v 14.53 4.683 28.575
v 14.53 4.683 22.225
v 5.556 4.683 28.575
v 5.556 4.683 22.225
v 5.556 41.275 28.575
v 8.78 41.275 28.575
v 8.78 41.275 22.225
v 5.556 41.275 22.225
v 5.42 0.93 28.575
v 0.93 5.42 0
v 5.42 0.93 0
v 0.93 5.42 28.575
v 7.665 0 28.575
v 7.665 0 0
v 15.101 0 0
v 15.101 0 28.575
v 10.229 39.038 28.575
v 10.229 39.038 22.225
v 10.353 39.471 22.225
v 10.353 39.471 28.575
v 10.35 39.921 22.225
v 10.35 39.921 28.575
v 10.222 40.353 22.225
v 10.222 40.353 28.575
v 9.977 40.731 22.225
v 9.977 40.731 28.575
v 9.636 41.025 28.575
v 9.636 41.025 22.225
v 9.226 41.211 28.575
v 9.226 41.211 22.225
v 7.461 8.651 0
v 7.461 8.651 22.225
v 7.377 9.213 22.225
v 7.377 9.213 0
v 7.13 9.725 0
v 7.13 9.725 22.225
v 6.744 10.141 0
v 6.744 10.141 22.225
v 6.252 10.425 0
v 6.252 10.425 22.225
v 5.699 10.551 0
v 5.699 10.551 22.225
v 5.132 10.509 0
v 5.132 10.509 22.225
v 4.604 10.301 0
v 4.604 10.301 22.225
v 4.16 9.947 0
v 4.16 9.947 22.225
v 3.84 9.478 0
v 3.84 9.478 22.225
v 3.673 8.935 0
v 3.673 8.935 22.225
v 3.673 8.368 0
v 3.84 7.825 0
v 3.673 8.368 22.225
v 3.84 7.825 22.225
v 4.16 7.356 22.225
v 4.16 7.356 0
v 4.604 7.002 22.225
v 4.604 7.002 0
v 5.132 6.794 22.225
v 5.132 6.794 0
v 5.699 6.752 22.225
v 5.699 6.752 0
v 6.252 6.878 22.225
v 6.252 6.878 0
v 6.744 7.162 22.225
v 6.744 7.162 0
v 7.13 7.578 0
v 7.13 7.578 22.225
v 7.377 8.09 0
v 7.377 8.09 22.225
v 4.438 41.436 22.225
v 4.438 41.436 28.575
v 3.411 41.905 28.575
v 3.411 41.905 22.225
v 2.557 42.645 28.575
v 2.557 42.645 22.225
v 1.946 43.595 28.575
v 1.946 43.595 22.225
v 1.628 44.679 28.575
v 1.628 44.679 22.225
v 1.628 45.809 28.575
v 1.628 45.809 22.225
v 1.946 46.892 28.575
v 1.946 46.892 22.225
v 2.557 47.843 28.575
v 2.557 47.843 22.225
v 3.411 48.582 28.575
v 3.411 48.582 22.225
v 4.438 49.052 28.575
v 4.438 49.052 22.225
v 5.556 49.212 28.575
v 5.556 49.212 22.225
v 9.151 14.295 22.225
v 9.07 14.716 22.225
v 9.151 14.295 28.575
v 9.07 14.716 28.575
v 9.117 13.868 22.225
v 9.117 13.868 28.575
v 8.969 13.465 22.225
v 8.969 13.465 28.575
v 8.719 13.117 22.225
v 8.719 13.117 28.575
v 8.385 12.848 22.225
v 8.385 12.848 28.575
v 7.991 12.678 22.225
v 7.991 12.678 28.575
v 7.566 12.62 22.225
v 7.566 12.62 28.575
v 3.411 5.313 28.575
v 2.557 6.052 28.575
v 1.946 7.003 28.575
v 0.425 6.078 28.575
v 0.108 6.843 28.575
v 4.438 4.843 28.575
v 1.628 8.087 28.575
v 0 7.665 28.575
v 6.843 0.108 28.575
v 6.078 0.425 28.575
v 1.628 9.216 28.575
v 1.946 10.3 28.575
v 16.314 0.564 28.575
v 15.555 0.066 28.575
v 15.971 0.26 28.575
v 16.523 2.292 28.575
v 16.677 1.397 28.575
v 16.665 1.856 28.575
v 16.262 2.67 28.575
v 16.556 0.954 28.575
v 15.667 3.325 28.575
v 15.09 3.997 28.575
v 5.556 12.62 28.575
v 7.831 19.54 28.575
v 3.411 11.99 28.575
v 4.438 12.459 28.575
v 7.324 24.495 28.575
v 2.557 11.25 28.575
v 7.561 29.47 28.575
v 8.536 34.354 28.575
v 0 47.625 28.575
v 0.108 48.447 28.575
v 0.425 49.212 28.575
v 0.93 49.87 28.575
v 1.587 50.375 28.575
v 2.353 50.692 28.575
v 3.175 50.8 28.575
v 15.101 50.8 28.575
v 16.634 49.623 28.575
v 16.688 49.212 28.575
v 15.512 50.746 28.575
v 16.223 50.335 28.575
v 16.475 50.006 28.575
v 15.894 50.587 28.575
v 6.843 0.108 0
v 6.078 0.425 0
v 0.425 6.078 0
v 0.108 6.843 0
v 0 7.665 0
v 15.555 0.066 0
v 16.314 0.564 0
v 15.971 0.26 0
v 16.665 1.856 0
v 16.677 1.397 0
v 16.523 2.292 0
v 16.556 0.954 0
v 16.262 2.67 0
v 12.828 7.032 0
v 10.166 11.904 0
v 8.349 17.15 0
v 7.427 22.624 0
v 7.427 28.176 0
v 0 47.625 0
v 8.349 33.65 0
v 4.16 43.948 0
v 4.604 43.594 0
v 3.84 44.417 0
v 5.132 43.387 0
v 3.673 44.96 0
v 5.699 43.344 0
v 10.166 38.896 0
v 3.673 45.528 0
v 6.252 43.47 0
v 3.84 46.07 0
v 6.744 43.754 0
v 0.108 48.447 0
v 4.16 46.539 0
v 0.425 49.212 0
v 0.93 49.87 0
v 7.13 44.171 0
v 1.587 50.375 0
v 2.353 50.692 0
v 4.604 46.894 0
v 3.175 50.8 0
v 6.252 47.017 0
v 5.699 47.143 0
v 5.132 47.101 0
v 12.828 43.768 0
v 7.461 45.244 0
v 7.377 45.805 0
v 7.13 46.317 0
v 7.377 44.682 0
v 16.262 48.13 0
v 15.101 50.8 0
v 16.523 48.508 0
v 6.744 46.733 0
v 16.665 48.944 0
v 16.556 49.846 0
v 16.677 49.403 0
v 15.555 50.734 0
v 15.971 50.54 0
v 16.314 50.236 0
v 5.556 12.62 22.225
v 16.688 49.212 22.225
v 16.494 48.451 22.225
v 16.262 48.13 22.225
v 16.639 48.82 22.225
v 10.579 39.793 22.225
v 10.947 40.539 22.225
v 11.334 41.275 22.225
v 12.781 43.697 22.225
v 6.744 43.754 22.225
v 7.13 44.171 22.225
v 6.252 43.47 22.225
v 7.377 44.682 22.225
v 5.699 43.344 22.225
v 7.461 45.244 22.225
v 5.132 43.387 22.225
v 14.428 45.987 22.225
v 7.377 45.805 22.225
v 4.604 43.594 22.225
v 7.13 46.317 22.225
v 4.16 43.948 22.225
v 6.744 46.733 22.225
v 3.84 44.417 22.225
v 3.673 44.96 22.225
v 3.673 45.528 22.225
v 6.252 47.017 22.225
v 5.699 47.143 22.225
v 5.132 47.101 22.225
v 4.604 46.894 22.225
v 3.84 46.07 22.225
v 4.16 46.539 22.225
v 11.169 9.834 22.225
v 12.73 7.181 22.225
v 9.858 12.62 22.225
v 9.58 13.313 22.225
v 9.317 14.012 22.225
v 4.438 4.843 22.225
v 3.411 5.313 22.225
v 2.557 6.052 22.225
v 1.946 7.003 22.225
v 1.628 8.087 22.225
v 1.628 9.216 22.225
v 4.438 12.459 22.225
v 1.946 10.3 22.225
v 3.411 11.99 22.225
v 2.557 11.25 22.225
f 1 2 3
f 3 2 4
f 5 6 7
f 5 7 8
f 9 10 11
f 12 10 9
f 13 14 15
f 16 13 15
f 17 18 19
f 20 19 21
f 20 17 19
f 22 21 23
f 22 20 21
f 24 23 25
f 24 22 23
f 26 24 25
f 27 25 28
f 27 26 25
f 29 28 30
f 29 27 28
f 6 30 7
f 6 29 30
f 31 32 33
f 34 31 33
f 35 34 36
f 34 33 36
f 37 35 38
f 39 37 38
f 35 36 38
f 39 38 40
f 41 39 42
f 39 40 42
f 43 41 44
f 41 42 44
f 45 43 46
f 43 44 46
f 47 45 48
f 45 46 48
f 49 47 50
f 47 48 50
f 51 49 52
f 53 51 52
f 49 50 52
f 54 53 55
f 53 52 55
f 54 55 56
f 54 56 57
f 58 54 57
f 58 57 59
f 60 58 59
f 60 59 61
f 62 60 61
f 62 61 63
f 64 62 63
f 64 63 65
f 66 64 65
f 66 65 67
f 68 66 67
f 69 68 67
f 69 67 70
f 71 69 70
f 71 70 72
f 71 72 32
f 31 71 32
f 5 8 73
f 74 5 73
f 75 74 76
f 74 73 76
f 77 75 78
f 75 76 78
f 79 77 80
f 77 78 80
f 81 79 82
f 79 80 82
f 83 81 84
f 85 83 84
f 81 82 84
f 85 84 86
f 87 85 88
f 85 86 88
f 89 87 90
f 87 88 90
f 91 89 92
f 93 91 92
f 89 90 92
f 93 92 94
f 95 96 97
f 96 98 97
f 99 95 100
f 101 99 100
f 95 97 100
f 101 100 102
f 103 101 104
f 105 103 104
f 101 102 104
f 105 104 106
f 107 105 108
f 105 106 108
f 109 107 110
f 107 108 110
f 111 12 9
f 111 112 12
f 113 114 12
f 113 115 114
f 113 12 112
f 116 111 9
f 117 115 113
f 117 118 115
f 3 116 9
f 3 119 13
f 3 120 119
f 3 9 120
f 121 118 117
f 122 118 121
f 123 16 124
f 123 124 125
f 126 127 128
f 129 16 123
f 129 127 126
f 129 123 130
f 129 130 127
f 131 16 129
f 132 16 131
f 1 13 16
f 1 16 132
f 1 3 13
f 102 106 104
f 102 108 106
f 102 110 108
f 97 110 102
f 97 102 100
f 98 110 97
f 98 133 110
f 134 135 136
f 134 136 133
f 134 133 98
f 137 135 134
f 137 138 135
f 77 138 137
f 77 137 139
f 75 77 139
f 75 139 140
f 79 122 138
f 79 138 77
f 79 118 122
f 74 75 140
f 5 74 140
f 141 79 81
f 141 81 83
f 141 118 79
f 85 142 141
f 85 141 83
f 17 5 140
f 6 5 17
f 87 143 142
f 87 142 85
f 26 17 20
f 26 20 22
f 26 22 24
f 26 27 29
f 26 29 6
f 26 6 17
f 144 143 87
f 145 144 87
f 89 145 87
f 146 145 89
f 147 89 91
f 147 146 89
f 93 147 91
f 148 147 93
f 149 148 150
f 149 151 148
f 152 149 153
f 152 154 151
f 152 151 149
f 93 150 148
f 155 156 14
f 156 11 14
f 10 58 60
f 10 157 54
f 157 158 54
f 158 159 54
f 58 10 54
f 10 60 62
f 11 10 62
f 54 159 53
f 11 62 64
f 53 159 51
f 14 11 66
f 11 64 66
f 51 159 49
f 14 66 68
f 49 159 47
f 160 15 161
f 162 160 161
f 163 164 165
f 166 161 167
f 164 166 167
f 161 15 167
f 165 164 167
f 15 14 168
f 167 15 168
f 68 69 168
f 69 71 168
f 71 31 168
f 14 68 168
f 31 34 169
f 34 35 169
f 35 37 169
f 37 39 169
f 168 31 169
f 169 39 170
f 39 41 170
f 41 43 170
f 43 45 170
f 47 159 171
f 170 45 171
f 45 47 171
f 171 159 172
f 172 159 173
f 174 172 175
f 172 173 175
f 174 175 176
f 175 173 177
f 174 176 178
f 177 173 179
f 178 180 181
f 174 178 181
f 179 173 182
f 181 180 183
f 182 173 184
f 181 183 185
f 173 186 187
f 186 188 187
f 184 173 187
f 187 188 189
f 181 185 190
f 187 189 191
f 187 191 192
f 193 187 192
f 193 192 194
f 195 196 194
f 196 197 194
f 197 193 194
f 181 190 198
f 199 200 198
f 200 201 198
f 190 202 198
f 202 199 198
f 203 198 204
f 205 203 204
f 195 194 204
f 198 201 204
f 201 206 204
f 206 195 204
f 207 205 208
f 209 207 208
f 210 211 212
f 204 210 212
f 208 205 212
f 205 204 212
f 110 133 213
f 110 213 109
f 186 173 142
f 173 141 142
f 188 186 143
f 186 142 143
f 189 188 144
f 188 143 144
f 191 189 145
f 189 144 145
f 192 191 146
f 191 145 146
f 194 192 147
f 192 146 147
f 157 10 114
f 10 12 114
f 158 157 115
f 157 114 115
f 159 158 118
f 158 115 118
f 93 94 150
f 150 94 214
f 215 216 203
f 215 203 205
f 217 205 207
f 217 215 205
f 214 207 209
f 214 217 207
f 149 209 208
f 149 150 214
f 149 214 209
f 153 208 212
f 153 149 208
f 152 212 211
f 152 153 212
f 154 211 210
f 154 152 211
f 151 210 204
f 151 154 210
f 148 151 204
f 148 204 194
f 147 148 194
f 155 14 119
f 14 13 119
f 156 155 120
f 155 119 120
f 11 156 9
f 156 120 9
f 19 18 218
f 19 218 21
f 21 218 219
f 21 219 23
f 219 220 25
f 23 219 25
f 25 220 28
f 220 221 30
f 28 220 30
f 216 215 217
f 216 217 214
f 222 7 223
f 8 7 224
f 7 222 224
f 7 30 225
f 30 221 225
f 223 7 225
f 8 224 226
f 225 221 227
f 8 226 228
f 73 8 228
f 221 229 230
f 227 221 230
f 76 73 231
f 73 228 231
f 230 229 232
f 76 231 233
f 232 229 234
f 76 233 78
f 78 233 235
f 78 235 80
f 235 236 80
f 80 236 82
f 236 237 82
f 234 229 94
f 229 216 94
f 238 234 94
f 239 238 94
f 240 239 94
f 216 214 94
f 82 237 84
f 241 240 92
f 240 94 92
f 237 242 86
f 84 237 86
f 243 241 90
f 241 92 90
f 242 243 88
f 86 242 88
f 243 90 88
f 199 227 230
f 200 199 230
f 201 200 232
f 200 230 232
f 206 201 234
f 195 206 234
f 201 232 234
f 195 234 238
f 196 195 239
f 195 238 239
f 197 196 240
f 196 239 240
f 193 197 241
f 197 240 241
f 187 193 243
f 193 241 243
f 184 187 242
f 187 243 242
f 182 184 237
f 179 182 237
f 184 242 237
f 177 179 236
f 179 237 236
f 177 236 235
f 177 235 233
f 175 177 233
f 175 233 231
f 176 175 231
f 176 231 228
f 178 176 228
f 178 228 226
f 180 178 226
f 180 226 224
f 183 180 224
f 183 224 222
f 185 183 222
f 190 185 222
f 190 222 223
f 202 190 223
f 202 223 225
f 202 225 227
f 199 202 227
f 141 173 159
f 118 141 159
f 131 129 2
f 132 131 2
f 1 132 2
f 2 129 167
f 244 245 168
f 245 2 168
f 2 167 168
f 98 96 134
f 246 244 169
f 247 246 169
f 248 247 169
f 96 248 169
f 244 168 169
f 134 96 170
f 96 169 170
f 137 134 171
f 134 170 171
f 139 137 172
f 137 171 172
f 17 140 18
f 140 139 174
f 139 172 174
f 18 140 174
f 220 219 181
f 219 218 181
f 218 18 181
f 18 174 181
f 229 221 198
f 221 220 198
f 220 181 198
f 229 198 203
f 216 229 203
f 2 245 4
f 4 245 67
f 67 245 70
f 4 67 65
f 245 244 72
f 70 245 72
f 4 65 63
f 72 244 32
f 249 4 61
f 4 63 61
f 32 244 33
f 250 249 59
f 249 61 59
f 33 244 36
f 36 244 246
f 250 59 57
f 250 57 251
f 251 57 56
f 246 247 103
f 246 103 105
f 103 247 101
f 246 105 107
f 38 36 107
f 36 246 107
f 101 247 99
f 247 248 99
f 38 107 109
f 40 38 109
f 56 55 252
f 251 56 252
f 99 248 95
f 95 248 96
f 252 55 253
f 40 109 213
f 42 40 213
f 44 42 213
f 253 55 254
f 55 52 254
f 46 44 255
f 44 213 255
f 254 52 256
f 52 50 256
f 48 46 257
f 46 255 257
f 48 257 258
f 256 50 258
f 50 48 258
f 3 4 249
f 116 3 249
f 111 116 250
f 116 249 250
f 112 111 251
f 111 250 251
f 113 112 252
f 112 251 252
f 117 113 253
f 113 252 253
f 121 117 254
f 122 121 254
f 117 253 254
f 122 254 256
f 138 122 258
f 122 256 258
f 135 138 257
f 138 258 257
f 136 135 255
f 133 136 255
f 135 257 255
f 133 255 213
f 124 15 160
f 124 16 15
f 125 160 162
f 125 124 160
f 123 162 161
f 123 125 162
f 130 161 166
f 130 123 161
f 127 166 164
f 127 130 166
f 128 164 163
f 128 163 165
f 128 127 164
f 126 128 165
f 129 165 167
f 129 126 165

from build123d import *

# Parameters (mm, degrees)
BOSS_EXTRUDE1_DEPTH = 28.575
CHAMFER1_SIZE       = 6.35
SKETCH3_R           = 1.905
CUT_EXTRUDE1_DEPTH  = 62.321512782
FILLET1_R           = 3.175
CUT_EXTRUDE4_START  = -6.35
CUT_EXTRUDE4_DEPTH  = 6.35
FILLET3_R           = 1.5875
FILLET5_R           = 1.5875


with BuildPart() as part:
    # Sketch2 → Boss-Extrude1 (new body)
    with BuildSketch(Plane.XY):
        with BuildLine():
            Line((0, 0), (19.056686619, 0))
            ThreePointArc((19.056686619, 0), (7.311521051, 25.4), (19.056686619, 50.8))
            Line((19.056686619, 50.8), (0, 50.8))
            Line((0, 50.8), (0, 0))
        make_face()
    extrude(amount=BOSS_EXTRUDE1_DEPTH)

    # Chamfer1
    chamfer1_edges = [part.edges().sort_by_distance(p)[0] for p in [
        (0, 0, 14.2875),
    ]]
    chamfer(chamfer1_edges, length=CHAMFER1_SIZE)

    # Sketch3 → Cut-Extrude1 (cut, through all)
    with BuildSketch(Plane.XY.offset(28.575)):
        with Locations((5.55625, 45.24375)):
            Circle(SKETCH3_R)
        with Locations((5.55625, 8.651474106)):
            Circle(SKETCH3_R)
    extrude(amount=-CUT_EXTRUDE1_DEPTH, mode=Mode.SUBTRACT)

    # Fillet1
    fillet1_edges = [part.edges().sort_by_distance(p)[0] for p in [
        (0, 50.8, 14.2875),
        (6.35, 0, 14.2875),
        (0, 6.35, 14.2875),
    ]]
    fillet(fillet1_edges, radius=FILLET1_R)

    # Sketch6 → Cut-Extrude4 (cut)
    with BuildSketch(Plane.XY.offset(28.575).offset(CUT_EXTRUDE4_START)):
        with BuildLine():
            Line((5.55625, 49.2125), (17.317631251, 49.2125))
            ThreePointArc((17.317631251, 49.2125), (14.028288765, 45.468022294), (11.333951868, 41.275))
            Line((11.333951868, 41.275), (5.55625, 41.275))
            ThreePointArc((5.55625, 41.275), (1.5875, 45.24375), (5.55625, 49.2125))
        make_face()
        with BuildLine():
            Line((5.55625, 12.620224106), (9.858336838, 12.620224106))
            ThreePointArc((9.858336838, 12.620224106), (11.918918568, 8.489348991), (14.530380471, 4.682724106))
            Line((14.530380471, 4.682724106), (5.55625, 4.682724106))
            ThreePointArc((5.55625, 4.682724106), (1.5875, 8.651474106), (5.55625, 12.620224106))
        make_face()
    extrude(amount=CUT_EXTRUDE4_DEPTH, mode=Mode.SUBTRACT)

    # Fillet3
    fillet3_edges = [part.edges().sort_by_distance(p)[0] for p in [
        (19.056686619, 0, 14.2875),
        (19.056686619, 50.8, 14.2875),
    ]]
    fillet(fillet3_edges, radius=FILLET3_R)

    # Fillet5
    fillet5_edges = [part.edges().sort_by_distance(p)[0] for p in [
        (11.333951868, 41.275, 25.4),
        (9.858336838, 12.620224106, 25.4),
    ]]
    fillet(fillet5_edges, radius=FILLET5_R)


solid = part.part
